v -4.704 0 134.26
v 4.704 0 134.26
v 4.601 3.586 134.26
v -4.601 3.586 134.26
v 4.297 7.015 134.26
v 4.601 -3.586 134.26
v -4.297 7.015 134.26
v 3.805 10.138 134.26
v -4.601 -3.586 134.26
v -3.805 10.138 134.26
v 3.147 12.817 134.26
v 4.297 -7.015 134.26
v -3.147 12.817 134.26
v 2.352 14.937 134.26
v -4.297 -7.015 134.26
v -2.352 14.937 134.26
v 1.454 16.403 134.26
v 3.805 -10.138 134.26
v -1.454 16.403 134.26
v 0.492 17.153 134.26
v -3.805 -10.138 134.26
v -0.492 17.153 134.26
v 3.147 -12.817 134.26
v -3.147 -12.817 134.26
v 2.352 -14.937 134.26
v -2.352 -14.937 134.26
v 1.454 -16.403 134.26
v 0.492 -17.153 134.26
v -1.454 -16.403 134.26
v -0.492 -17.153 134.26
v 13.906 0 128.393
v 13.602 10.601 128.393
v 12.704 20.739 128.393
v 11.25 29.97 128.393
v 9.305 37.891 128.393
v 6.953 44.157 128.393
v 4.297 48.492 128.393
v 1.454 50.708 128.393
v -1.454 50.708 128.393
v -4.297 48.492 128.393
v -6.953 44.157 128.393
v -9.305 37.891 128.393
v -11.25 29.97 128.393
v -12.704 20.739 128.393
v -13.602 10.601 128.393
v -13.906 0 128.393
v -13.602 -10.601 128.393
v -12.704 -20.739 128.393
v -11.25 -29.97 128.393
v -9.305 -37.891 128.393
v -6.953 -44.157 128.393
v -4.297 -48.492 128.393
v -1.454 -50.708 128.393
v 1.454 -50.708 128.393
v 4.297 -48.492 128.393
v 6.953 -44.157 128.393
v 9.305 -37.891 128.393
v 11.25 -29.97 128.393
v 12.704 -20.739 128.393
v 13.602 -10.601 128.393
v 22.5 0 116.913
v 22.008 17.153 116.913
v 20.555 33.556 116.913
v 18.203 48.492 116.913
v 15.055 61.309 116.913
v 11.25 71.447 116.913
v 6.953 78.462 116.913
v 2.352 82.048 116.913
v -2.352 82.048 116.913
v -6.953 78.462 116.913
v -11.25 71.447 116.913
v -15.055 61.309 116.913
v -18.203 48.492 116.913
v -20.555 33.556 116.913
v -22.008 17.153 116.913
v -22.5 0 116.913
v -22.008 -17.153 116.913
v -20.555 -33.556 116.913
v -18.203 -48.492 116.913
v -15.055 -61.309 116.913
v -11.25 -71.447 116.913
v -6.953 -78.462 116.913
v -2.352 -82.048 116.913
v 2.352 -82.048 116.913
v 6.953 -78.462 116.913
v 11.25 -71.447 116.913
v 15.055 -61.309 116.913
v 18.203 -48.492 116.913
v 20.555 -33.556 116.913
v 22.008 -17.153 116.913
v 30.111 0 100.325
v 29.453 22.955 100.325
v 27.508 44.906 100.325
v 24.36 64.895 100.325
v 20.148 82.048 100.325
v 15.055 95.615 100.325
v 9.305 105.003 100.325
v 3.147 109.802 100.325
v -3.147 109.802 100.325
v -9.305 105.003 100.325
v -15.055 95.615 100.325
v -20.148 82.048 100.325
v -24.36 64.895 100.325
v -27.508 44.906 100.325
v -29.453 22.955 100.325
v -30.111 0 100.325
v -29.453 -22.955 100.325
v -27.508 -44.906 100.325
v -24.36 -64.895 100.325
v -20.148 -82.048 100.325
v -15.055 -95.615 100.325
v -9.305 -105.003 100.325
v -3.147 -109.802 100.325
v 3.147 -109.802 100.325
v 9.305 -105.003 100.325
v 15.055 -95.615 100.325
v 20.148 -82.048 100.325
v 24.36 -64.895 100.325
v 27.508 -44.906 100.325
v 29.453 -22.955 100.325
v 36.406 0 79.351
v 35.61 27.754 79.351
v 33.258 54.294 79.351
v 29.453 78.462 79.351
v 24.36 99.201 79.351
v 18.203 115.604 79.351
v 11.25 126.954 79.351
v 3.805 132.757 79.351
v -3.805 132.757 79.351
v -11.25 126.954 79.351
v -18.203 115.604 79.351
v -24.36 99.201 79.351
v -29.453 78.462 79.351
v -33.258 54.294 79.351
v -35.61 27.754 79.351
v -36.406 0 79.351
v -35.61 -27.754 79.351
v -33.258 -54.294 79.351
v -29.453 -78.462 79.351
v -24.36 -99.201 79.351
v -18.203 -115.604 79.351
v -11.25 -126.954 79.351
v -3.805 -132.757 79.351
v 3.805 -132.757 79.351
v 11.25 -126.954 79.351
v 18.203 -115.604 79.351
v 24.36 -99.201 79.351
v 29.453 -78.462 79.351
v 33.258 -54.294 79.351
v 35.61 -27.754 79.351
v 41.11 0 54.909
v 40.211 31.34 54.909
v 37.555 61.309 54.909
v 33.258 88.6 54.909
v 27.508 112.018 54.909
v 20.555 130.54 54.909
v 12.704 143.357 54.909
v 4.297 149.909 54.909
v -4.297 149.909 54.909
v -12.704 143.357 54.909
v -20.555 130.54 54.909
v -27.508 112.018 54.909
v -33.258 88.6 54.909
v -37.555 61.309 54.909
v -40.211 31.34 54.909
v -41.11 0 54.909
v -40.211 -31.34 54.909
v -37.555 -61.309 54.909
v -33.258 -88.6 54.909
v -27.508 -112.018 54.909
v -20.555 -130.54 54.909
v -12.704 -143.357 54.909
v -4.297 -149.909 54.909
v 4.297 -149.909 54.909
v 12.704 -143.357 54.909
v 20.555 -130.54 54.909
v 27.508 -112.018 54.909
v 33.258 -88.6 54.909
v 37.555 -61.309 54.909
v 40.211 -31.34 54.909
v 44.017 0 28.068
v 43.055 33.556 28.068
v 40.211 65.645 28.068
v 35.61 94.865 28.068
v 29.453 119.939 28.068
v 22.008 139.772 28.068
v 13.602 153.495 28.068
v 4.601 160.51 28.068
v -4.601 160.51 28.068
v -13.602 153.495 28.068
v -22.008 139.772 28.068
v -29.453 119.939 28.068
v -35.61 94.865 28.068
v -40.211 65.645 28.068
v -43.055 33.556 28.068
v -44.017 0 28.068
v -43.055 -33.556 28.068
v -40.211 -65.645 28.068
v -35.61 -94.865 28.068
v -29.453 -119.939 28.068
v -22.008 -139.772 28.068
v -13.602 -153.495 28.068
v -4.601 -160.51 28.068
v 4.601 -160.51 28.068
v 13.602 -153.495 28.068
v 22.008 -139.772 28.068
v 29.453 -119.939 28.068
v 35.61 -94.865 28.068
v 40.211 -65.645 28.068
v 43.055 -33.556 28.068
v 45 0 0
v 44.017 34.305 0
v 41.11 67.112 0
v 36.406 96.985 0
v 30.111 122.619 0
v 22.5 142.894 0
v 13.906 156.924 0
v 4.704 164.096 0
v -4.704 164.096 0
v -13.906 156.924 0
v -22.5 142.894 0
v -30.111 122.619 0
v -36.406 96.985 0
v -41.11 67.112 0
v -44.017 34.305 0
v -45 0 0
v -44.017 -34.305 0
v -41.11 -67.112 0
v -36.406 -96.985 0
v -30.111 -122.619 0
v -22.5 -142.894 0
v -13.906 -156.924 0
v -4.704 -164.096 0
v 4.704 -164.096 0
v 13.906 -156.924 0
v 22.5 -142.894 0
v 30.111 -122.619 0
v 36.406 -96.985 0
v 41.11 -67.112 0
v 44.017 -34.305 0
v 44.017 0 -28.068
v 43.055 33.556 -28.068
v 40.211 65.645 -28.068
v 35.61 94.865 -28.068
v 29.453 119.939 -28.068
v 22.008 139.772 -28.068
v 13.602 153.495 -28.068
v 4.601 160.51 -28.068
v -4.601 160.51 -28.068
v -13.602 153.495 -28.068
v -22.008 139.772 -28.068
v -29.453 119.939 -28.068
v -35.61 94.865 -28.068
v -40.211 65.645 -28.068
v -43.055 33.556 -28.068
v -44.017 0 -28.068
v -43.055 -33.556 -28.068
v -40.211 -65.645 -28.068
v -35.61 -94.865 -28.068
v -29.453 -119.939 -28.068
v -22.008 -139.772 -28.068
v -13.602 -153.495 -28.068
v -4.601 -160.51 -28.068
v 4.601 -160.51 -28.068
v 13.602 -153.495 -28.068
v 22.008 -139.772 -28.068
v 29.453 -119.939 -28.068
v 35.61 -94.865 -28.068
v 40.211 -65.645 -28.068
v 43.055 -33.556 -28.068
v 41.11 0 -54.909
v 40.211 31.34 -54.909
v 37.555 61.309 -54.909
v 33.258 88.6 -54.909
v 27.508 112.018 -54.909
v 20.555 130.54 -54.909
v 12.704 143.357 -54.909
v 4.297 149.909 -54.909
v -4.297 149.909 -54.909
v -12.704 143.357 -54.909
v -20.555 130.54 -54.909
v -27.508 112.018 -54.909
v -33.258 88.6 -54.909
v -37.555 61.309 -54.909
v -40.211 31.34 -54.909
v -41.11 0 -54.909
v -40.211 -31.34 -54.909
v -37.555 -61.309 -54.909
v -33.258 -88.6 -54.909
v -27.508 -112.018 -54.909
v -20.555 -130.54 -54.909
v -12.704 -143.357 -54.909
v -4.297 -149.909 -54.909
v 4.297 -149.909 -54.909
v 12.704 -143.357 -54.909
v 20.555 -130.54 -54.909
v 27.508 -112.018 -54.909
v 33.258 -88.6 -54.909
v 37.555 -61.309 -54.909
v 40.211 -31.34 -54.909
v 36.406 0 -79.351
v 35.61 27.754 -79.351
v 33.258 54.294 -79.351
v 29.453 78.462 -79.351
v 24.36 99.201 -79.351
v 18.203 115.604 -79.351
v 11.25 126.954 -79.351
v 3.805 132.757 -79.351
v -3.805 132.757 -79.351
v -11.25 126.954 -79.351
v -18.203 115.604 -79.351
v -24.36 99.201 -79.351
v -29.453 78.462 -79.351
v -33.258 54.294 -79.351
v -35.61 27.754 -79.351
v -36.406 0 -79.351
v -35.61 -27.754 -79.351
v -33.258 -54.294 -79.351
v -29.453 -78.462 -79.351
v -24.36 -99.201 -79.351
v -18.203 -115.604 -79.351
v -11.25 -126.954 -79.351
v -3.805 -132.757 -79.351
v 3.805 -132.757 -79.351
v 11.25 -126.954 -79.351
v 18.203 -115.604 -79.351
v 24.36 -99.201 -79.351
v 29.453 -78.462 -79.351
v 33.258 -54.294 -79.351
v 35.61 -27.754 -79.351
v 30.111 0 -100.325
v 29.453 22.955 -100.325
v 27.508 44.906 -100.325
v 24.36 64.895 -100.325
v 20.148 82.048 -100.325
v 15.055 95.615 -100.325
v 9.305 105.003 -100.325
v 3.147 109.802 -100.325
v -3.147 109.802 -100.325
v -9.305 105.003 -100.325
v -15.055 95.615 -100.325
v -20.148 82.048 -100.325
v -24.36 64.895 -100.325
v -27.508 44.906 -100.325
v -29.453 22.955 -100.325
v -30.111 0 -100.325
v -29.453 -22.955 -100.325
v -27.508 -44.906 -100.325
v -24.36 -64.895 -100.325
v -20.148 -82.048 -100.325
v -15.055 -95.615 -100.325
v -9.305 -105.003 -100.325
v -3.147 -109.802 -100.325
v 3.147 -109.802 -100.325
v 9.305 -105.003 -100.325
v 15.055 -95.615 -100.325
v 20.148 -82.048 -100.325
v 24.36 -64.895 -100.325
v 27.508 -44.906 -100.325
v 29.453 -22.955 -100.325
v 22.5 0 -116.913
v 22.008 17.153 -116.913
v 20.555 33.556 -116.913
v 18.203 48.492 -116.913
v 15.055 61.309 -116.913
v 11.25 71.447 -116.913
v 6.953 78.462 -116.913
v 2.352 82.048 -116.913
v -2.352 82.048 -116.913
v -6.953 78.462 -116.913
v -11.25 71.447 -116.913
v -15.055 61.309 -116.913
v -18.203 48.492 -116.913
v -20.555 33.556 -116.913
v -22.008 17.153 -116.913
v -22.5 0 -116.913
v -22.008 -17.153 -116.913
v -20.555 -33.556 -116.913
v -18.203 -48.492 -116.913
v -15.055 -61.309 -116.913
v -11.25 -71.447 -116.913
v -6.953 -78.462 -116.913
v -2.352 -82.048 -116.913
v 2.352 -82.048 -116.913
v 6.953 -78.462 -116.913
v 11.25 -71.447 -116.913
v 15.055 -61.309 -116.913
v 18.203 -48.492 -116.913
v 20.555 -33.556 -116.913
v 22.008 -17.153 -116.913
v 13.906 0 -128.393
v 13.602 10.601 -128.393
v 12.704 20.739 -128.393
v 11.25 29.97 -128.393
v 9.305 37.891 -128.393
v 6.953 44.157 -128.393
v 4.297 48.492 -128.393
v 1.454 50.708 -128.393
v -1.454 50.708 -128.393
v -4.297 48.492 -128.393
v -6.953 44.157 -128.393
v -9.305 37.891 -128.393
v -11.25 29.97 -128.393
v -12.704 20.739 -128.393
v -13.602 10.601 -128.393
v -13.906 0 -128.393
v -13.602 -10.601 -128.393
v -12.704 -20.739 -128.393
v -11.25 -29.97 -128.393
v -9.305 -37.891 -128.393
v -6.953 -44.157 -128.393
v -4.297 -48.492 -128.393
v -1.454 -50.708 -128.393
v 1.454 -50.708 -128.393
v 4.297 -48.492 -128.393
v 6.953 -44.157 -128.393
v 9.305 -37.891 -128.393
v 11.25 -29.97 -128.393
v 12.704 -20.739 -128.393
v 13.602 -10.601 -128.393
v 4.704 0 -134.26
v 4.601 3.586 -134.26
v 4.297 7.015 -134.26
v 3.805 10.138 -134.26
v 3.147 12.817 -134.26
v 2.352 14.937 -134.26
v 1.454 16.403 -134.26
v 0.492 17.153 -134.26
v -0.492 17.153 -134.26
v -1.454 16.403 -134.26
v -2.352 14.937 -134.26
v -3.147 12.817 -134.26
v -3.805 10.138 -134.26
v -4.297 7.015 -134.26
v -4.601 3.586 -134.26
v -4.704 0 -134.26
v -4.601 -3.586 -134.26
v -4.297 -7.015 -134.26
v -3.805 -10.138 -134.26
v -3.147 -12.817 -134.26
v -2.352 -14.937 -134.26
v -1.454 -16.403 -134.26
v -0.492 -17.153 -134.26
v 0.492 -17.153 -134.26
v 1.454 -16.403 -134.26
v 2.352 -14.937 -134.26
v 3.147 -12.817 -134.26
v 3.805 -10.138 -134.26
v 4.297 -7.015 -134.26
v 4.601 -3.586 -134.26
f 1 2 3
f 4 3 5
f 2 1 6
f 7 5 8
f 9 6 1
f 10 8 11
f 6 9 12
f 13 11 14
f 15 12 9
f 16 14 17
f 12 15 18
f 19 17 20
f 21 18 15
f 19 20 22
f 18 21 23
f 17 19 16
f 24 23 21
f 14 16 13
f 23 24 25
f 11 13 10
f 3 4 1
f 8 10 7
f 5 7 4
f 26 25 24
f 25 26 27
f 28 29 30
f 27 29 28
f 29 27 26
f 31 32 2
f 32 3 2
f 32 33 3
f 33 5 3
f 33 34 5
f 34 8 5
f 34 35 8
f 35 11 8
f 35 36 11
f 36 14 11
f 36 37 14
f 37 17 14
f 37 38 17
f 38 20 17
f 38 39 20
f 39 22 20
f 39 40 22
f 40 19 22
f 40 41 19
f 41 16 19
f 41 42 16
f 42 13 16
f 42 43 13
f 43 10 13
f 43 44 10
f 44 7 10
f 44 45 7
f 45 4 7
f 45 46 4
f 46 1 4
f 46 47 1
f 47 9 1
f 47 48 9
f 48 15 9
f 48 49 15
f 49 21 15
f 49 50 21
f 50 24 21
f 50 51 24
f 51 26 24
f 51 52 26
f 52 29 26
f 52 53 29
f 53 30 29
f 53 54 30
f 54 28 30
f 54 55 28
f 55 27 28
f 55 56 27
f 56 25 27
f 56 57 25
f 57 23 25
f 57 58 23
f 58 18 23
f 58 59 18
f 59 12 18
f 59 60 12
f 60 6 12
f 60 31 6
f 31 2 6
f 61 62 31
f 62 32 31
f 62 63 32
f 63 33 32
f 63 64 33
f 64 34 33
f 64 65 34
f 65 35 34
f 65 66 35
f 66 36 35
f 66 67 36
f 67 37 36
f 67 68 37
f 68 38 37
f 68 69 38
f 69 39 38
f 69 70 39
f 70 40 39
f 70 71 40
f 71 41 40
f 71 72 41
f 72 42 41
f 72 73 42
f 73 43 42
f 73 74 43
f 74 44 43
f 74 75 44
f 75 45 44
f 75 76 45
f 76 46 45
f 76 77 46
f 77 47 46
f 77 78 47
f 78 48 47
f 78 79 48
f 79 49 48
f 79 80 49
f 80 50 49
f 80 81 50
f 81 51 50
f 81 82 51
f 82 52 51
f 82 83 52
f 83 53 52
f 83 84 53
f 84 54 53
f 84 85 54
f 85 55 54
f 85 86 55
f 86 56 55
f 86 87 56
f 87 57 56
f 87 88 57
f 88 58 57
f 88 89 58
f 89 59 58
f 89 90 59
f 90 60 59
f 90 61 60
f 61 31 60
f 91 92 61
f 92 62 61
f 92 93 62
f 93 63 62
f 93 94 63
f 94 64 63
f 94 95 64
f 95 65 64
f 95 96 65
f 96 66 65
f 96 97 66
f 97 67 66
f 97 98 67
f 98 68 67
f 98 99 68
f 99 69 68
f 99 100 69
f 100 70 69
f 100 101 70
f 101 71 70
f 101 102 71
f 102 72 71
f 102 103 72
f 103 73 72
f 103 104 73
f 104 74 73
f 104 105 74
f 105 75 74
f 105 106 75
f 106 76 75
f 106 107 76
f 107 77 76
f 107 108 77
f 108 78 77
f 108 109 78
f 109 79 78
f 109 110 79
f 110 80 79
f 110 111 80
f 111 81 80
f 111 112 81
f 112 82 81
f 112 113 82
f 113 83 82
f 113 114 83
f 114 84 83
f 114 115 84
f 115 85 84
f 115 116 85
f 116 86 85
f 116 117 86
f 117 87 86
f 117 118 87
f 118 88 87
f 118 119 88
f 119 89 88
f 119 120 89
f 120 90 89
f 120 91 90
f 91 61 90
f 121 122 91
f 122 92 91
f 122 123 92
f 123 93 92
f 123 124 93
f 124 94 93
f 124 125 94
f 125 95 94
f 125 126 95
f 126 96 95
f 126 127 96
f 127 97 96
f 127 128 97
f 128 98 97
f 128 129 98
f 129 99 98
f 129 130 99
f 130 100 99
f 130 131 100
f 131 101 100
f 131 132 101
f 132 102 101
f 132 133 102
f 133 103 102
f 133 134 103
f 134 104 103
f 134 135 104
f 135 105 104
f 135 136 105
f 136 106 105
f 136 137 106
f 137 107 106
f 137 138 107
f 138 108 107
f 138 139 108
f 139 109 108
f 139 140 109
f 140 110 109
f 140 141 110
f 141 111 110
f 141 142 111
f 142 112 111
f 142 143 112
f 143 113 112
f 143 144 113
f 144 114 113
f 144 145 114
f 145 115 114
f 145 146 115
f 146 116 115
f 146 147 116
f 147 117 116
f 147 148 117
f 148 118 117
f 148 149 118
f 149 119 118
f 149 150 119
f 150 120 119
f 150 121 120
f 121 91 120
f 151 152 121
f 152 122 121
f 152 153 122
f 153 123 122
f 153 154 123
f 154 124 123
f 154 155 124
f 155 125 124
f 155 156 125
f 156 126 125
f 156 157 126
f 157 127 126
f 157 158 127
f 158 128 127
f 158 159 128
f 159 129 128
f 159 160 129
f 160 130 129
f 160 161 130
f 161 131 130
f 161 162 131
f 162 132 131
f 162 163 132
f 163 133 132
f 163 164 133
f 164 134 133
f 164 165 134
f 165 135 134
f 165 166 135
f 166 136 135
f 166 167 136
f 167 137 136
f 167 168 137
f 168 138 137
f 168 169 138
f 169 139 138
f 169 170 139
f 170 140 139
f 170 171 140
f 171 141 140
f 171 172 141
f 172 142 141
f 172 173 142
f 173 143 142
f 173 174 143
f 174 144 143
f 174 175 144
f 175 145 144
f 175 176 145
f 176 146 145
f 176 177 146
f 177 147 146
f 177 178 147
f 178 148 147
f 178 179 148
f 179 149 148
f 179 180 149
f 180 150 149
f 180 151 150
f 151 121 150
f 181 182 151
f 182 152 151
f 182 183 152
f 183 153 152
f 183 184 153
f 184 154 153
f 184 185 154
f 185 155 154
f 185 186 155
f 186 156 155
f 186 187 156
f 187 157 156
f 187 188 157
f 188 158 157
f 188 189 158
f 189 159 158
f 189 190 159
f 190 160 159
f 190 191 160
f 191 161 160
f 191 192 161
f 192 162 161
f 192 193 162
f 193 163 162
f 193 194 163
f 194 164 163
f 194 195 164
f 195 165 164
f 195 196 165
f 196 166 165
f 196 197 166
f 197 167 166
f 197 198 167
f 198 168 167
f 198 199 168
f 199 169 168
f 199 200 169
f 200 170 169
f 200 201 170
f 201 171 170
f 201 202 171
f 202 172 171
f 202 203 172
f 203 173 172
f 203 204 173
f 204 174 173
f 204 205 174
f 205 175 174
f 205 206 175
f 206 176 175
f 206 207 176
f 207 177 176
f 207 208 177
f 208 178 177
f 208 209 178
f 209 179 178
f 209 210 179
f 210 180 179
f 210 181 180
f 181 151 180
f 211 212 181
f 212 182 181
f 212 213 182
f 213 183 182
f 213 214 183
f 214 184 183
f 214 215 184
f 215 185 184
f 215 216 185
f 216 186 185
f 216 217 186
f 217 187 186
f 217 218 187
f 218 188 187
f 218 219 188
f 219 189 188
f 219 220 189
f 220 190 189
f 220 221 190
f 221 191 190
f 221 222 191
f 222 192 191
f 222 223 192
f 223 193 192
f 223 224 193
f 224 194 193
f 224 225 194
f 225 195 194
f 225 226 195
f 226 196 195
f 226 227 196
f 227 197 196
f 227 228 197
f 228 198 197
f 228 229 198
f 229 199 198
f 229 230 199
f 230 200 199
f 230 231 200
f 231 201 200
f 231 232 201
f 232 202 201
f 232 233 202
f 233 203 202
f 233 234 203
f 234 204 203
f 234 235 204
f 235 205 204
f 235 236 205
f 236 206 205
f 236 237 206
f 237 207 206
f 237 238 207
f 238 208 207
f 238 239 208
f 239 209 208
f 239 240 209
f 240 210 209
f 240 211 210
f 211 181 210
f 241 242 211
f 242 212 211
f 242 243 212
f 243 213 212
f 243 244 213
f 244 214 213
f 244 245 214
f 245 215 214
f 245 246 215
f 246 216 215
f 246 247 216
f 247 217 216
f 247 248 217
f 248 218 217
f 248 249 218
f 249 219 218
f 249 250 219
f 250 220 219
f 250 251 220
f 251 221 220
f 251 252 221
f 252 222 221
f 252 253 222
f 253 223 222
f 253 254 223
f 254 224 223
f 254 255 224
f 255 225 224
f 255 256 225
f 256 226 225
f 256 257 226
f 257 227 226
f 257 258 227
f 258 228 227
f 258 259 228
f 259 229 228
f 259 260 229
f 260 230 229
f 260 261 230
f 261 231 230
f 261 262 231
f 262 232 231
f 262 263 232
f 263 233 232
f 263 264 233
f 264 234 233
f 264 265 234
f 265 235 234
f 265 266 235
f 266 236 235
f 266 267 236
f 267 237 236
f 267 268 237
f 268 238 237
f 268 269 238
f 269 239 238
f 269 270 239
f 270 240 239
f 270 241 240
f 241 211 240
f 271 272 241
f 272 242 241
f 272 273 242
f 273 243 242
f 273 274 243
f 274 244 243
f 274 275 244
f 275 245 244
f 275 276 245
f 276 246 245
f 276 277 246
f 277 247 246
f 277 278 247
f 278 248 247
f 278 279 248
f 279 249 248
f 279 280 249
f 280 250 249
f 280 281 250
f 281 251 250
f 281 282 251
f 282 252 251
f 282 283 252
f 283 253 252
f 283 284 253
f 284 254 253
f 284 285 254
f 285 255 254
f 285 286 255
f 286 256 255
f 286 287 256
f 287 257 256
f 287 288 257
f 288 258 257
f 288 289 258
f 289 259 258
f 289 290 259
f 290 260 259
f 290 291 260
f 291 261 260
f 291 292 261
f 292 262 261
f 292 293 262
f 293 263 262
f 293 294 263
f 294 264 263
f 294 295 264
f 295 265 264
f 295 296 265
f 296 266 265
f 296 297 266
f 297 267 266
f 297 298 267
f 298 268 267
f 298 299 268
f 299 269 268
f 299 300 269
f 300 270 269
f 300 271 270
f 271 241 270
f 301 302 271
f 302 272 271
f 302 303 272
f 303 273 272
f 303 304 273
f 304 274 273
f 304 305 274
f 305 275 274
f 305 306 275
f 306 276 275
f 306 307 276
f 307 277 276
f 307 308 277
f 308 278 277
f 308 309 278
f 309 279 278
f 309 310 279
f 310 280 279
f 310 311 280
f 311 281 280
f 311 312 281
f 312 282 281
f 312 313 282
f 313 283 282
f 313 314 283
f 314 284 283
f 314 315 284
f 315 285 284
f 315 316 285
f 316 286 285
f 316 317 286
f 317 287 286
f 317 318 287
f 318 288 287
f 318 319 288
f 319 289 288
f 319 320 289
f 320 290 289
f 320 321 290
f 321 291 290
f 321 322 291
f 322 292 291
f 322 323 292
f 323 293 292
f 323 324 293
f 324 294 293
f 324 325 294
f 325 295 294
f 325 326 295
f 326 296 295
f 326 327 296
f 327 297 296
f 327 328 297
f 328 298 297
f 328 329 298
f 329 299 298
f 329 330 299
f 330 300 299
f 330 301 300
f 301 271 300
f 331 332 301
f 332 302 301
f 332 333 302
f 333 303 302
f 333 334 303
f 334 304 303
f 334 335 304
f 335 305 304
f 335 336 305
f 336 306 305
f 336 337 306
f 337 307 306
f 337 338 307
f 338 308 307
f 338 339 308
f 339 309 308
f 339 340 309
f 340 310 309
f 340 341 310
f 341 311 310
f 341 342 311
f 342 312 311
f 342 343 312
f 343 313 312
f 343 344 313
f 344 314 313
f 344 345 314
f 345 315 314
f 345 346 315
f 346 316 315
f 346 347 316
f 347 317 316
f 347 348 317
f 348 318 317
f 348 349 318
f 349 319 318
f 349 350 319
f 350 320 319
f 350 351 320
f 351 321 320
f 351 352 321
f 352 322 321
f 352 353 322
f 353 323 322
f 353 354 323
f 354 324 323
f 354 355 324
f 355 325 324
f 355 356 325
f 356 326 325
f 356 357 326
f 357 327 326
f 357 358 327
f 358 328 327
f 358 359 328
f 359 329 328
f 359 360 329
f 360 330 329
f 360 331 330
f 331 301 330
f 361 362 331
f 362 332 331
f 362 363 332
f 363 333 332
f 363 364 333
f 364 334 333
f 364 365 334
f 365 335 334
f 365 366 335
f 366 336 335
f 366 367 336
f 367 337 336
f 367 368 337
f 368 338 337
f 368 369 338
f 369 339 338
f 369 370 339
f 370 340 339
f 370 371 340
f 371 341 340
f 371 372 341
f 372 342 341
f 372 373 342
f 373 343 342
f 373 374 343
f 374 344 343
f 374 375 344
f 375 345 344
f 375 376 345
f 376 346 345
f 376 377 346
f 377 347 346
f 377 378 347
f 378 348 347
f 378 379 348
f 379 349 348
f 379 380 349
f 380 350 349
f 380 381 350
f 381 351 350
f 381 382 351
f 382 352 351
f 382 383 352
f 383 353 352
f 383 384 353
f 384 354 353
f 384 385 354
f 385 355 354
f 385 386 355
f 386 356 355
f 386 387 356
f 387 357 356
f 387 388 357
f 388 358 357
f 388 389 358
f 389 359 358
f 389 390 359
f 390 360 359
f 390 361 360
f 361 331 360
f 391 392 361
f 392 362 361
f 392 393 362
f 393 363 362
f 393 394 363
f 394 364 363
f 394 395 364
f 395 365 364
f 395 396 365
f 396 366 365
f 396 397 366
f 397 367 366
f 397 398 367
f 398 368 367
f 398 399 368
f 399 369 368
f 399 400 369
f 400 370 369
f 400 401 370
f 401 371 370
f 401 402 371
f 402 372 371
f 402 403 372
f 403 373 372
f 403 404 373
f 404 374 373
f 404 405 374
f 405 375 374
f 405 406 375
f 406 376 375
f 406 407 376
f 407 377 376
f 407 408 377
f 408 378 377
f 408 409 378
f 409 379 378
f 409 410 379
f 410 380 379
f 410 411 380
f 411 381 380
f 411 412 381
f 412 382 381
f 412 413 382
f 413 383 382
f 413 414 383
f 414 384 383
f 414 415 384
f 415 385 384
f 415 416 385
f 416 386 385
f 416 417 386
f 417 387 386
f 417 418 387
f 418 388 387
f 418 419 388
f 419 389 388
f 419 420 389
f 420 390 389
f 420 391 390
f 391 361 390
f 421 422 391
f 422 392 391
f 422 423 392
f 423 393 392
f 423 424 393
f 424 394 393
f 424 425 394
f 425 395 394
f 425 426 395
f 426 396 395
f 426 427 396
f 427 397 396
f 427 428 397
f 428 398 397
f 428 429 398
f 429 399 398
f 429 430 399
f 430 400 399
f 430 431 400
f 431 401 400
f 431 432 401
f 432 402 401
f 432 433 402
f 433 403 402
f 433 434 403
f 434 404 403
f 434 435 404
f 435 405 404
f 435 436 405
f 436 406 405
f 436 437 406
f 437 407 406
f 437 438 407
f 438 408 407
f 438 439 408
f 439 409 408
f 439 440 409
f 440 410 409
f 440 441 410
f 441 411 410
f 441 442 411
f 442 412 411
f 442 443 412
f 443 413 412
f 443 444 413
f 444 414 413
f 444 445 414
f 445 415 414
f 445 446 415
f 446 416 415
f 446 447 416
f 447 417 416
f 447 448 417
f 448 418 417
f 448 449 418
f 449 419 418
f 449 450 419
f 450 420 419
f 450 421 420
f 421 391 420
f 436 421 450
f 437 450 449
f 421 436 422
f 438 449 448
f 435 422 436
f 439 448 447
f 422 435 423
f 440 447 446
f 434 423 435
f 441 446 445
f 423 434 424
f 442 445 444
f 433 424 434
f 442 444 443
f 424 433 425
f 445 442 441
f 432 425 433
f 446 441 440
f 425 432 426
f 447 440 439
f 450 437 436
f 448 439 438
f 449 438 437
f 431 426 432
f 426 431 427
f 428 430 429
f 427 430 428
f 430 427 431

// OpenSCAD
// Generated by SolidPython 1.0.1 on 2020-07-29 00:46:45


scale(v = [3, 11, 9]) {
	sphere(r = 15);
}
/***********************************************
*********      SolidPython code:      **********
************************************************
 
# import packages: SolidPython
from solid import *
from solid.utils import *
from itertools import chain, combinations, permutations


class Resize:

    def __init__(self, scad_file):
        self.scad_file = scad_file
        #self.scad_file = import_scad(scad_file)
        # cone/cylinder param:
        self.r1 = 0
        self.r2 = 0
        self.h = 0
        # rectangular prism param:
        self.w = 0
        self.l = 0
        # ellipse param:
        self.r = 0

    # import OpenScad code (file name corresponds to shape)


    # classify shape + parameters
    def assign(self, param1, param2, param3):
        if self.scad_file == 'cone.scad':
            self.r1 = param1
            self.r2 = param2
            self.h = param3
        elif self.scad_file == 'cylinder.scad':
            self.r1 = param1
            self.r2 = param2
            self.h = param3
        elif self.scad_file == 'rectangularPrism.scad':
            self.h = param1
            self.l = param2
            self.w = param3
        else:
            self.r = param1
            self.h = param2

    # resize parameters
    def iterate(self):
        x = range(3, 20, 2)
        i = 1
        if self.scad_file == 'cone.scad':
            tempList = list(permutations(x, 2))
            for temp in tempList:
                param1 = temp[0]
                param2 = temp[1]
                filepath = 'produced_scad_files/' + 'cone' + str(param1) + '_' + str(param2) + '_' + '.scad'
                scad_render_to_file(cylinder(h=param1, r1=param2, r2=0), filepath)

        elif self.scad_file == 'cylinder.scad':
            tempList = list(permutations(x, 3))
            for temp in tempList:
                param1 = temp[0]
                param2 = temp[1]
                filepath = 'produced_scad_files/' + 'cylinder' + str(param1) + '_' + str(param2) + '_' + '.scad'
                scad_render_to_file(cylinder(h=param1, r1=param2, r2=param2), filepath)

        elif self.scad_file == 'rectangularPrism.scad':
            tempList = list(permutations(x, 3))
            for temp in tempList:
                param1 = temp[0]
                param2 = temp[1]
                param3 = temp[2]
                filepath = 'produced_scad_files/' + 'rectangularPrism' + str(param1) + '_' + str(param2) + '_' + str(
                    param3) + '.scad'
                scad_render_to_file(cube(size=(param1, param2, param3)), filepath)

        elif self.scad_file == 'ellipse.scad':
            tempList = list(permutations(x, 4))
            for temp in tempList:
                param1 = temp[0]
                param2 = temp[1]
                param3 = temp[2]
                param4 = temp[3]
                filepath = 'produced_scad_files/' + 'ellipse' + str(param1) + '_' + str(param2) + '_' + str(param3) + '_' + str(param4) + '.scad'
                scad_render_to_file(scale([param1, param2, param3])(sphere(r=param4)), filepath)

    def render_to_scadfile(self):
        scad_render_to_file(scad, 'example.scad') 
 
************************************************/
